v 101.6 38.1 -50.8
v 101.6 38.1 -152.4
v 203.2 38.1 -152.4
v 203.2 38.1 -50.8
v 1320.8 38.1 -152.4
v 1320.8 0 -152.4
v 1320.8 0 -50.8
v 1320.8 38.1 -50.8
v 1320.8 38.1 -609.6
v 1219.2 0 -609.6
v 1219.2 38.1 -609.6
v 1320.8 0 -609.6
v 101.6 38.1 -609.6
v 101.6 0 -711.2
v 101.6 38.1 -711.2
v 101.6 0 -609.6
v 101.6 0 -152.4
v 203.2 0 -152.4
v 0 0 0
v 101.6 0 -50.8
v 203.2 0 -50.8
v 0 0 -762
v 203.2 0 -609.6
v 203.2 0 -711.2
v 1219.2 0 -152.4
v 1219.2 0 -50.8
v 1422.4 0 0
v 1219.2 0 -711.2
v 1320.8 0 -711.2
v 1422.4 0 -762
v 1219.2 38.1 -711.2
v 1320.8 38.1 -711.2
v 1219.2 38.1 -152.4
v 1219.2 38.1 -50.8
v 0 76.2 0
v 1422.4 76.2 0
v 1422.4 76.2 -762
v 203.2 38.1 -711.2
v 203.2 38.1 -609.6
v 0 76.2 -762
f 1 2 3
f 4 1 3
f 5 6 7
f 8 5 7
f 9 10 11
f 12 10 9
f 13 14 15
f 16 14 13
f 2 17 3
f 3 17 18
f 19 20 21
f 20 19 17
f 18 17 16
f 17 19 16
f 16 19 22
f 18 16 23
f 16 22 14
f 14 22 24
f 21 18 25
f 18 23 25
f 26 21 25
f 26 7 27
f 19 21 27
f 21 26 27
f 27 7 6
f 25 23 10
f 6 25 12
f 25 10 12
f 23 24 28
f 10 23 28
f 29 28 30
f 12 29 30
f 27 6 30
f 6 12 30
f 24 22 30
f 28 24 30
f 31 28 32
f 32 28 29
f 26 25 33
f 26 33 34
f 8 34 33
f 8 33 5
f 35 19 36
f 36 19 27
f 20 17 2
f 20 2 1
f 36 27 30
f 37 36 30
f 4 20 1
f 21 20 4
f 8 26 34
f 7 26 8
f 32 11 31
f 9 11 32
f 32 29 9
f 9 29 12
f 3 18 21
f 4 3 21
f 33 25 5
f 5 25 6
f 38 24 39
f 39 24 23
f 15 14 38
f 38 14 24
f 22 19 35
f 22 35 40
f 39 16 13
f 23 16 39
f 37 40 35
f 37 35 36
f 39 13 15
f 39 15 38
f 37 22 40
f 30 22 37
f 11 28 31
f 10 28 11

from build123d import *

# Parameters (mm, degrees)
SKETCH1_W           = 1422.4
SKETCH1_H           = 762
BOSS_EXTRUDE1_DEPTH = 76.2
SKETCH3_W           = 101.6
SKETCH3_H           = 101.6
CUT_EXTRUDE1_DEPTH  = 38.1


with BuildPart() as part:
    # Sketch1 → Boss-Extrude1 (new body)
    with BuildSketch(Plane(origin=(0, 0, 0), x_dir=(1, 0, 0), z_dir=(0, 1, 0))):
        with Locations((711.2, 381)):
            Rectangle(SKETCH1_W, SKETCH1_H)
    extrude(amount=BOSS_EXTRUDE1_DEPTH)

    # Sketch3 → Cut-Extrude1 (cut)
    with BuildSketch(Plane.XZ):
        with Locations((152.4, -101.6)):
            Rectangle(SKETCH3_W, SKETCH3_H)
        with Locations((152.4, -660.4)):
            Rectangle(SKETCH3_W, SKETCH3_H)
        with Locations((1270, -101.6)):
            Rectangle(SKETCH3_W, SKETCH3_H)
        with Locations((1270, -660.4)):
            Rectangle(SKETCH3_W, SKETCH3_H)
    extrude(amount=-CUT_EXTRUDE1_DEPTH, mode=Mode.SUBTRACT)


solid = part.part
